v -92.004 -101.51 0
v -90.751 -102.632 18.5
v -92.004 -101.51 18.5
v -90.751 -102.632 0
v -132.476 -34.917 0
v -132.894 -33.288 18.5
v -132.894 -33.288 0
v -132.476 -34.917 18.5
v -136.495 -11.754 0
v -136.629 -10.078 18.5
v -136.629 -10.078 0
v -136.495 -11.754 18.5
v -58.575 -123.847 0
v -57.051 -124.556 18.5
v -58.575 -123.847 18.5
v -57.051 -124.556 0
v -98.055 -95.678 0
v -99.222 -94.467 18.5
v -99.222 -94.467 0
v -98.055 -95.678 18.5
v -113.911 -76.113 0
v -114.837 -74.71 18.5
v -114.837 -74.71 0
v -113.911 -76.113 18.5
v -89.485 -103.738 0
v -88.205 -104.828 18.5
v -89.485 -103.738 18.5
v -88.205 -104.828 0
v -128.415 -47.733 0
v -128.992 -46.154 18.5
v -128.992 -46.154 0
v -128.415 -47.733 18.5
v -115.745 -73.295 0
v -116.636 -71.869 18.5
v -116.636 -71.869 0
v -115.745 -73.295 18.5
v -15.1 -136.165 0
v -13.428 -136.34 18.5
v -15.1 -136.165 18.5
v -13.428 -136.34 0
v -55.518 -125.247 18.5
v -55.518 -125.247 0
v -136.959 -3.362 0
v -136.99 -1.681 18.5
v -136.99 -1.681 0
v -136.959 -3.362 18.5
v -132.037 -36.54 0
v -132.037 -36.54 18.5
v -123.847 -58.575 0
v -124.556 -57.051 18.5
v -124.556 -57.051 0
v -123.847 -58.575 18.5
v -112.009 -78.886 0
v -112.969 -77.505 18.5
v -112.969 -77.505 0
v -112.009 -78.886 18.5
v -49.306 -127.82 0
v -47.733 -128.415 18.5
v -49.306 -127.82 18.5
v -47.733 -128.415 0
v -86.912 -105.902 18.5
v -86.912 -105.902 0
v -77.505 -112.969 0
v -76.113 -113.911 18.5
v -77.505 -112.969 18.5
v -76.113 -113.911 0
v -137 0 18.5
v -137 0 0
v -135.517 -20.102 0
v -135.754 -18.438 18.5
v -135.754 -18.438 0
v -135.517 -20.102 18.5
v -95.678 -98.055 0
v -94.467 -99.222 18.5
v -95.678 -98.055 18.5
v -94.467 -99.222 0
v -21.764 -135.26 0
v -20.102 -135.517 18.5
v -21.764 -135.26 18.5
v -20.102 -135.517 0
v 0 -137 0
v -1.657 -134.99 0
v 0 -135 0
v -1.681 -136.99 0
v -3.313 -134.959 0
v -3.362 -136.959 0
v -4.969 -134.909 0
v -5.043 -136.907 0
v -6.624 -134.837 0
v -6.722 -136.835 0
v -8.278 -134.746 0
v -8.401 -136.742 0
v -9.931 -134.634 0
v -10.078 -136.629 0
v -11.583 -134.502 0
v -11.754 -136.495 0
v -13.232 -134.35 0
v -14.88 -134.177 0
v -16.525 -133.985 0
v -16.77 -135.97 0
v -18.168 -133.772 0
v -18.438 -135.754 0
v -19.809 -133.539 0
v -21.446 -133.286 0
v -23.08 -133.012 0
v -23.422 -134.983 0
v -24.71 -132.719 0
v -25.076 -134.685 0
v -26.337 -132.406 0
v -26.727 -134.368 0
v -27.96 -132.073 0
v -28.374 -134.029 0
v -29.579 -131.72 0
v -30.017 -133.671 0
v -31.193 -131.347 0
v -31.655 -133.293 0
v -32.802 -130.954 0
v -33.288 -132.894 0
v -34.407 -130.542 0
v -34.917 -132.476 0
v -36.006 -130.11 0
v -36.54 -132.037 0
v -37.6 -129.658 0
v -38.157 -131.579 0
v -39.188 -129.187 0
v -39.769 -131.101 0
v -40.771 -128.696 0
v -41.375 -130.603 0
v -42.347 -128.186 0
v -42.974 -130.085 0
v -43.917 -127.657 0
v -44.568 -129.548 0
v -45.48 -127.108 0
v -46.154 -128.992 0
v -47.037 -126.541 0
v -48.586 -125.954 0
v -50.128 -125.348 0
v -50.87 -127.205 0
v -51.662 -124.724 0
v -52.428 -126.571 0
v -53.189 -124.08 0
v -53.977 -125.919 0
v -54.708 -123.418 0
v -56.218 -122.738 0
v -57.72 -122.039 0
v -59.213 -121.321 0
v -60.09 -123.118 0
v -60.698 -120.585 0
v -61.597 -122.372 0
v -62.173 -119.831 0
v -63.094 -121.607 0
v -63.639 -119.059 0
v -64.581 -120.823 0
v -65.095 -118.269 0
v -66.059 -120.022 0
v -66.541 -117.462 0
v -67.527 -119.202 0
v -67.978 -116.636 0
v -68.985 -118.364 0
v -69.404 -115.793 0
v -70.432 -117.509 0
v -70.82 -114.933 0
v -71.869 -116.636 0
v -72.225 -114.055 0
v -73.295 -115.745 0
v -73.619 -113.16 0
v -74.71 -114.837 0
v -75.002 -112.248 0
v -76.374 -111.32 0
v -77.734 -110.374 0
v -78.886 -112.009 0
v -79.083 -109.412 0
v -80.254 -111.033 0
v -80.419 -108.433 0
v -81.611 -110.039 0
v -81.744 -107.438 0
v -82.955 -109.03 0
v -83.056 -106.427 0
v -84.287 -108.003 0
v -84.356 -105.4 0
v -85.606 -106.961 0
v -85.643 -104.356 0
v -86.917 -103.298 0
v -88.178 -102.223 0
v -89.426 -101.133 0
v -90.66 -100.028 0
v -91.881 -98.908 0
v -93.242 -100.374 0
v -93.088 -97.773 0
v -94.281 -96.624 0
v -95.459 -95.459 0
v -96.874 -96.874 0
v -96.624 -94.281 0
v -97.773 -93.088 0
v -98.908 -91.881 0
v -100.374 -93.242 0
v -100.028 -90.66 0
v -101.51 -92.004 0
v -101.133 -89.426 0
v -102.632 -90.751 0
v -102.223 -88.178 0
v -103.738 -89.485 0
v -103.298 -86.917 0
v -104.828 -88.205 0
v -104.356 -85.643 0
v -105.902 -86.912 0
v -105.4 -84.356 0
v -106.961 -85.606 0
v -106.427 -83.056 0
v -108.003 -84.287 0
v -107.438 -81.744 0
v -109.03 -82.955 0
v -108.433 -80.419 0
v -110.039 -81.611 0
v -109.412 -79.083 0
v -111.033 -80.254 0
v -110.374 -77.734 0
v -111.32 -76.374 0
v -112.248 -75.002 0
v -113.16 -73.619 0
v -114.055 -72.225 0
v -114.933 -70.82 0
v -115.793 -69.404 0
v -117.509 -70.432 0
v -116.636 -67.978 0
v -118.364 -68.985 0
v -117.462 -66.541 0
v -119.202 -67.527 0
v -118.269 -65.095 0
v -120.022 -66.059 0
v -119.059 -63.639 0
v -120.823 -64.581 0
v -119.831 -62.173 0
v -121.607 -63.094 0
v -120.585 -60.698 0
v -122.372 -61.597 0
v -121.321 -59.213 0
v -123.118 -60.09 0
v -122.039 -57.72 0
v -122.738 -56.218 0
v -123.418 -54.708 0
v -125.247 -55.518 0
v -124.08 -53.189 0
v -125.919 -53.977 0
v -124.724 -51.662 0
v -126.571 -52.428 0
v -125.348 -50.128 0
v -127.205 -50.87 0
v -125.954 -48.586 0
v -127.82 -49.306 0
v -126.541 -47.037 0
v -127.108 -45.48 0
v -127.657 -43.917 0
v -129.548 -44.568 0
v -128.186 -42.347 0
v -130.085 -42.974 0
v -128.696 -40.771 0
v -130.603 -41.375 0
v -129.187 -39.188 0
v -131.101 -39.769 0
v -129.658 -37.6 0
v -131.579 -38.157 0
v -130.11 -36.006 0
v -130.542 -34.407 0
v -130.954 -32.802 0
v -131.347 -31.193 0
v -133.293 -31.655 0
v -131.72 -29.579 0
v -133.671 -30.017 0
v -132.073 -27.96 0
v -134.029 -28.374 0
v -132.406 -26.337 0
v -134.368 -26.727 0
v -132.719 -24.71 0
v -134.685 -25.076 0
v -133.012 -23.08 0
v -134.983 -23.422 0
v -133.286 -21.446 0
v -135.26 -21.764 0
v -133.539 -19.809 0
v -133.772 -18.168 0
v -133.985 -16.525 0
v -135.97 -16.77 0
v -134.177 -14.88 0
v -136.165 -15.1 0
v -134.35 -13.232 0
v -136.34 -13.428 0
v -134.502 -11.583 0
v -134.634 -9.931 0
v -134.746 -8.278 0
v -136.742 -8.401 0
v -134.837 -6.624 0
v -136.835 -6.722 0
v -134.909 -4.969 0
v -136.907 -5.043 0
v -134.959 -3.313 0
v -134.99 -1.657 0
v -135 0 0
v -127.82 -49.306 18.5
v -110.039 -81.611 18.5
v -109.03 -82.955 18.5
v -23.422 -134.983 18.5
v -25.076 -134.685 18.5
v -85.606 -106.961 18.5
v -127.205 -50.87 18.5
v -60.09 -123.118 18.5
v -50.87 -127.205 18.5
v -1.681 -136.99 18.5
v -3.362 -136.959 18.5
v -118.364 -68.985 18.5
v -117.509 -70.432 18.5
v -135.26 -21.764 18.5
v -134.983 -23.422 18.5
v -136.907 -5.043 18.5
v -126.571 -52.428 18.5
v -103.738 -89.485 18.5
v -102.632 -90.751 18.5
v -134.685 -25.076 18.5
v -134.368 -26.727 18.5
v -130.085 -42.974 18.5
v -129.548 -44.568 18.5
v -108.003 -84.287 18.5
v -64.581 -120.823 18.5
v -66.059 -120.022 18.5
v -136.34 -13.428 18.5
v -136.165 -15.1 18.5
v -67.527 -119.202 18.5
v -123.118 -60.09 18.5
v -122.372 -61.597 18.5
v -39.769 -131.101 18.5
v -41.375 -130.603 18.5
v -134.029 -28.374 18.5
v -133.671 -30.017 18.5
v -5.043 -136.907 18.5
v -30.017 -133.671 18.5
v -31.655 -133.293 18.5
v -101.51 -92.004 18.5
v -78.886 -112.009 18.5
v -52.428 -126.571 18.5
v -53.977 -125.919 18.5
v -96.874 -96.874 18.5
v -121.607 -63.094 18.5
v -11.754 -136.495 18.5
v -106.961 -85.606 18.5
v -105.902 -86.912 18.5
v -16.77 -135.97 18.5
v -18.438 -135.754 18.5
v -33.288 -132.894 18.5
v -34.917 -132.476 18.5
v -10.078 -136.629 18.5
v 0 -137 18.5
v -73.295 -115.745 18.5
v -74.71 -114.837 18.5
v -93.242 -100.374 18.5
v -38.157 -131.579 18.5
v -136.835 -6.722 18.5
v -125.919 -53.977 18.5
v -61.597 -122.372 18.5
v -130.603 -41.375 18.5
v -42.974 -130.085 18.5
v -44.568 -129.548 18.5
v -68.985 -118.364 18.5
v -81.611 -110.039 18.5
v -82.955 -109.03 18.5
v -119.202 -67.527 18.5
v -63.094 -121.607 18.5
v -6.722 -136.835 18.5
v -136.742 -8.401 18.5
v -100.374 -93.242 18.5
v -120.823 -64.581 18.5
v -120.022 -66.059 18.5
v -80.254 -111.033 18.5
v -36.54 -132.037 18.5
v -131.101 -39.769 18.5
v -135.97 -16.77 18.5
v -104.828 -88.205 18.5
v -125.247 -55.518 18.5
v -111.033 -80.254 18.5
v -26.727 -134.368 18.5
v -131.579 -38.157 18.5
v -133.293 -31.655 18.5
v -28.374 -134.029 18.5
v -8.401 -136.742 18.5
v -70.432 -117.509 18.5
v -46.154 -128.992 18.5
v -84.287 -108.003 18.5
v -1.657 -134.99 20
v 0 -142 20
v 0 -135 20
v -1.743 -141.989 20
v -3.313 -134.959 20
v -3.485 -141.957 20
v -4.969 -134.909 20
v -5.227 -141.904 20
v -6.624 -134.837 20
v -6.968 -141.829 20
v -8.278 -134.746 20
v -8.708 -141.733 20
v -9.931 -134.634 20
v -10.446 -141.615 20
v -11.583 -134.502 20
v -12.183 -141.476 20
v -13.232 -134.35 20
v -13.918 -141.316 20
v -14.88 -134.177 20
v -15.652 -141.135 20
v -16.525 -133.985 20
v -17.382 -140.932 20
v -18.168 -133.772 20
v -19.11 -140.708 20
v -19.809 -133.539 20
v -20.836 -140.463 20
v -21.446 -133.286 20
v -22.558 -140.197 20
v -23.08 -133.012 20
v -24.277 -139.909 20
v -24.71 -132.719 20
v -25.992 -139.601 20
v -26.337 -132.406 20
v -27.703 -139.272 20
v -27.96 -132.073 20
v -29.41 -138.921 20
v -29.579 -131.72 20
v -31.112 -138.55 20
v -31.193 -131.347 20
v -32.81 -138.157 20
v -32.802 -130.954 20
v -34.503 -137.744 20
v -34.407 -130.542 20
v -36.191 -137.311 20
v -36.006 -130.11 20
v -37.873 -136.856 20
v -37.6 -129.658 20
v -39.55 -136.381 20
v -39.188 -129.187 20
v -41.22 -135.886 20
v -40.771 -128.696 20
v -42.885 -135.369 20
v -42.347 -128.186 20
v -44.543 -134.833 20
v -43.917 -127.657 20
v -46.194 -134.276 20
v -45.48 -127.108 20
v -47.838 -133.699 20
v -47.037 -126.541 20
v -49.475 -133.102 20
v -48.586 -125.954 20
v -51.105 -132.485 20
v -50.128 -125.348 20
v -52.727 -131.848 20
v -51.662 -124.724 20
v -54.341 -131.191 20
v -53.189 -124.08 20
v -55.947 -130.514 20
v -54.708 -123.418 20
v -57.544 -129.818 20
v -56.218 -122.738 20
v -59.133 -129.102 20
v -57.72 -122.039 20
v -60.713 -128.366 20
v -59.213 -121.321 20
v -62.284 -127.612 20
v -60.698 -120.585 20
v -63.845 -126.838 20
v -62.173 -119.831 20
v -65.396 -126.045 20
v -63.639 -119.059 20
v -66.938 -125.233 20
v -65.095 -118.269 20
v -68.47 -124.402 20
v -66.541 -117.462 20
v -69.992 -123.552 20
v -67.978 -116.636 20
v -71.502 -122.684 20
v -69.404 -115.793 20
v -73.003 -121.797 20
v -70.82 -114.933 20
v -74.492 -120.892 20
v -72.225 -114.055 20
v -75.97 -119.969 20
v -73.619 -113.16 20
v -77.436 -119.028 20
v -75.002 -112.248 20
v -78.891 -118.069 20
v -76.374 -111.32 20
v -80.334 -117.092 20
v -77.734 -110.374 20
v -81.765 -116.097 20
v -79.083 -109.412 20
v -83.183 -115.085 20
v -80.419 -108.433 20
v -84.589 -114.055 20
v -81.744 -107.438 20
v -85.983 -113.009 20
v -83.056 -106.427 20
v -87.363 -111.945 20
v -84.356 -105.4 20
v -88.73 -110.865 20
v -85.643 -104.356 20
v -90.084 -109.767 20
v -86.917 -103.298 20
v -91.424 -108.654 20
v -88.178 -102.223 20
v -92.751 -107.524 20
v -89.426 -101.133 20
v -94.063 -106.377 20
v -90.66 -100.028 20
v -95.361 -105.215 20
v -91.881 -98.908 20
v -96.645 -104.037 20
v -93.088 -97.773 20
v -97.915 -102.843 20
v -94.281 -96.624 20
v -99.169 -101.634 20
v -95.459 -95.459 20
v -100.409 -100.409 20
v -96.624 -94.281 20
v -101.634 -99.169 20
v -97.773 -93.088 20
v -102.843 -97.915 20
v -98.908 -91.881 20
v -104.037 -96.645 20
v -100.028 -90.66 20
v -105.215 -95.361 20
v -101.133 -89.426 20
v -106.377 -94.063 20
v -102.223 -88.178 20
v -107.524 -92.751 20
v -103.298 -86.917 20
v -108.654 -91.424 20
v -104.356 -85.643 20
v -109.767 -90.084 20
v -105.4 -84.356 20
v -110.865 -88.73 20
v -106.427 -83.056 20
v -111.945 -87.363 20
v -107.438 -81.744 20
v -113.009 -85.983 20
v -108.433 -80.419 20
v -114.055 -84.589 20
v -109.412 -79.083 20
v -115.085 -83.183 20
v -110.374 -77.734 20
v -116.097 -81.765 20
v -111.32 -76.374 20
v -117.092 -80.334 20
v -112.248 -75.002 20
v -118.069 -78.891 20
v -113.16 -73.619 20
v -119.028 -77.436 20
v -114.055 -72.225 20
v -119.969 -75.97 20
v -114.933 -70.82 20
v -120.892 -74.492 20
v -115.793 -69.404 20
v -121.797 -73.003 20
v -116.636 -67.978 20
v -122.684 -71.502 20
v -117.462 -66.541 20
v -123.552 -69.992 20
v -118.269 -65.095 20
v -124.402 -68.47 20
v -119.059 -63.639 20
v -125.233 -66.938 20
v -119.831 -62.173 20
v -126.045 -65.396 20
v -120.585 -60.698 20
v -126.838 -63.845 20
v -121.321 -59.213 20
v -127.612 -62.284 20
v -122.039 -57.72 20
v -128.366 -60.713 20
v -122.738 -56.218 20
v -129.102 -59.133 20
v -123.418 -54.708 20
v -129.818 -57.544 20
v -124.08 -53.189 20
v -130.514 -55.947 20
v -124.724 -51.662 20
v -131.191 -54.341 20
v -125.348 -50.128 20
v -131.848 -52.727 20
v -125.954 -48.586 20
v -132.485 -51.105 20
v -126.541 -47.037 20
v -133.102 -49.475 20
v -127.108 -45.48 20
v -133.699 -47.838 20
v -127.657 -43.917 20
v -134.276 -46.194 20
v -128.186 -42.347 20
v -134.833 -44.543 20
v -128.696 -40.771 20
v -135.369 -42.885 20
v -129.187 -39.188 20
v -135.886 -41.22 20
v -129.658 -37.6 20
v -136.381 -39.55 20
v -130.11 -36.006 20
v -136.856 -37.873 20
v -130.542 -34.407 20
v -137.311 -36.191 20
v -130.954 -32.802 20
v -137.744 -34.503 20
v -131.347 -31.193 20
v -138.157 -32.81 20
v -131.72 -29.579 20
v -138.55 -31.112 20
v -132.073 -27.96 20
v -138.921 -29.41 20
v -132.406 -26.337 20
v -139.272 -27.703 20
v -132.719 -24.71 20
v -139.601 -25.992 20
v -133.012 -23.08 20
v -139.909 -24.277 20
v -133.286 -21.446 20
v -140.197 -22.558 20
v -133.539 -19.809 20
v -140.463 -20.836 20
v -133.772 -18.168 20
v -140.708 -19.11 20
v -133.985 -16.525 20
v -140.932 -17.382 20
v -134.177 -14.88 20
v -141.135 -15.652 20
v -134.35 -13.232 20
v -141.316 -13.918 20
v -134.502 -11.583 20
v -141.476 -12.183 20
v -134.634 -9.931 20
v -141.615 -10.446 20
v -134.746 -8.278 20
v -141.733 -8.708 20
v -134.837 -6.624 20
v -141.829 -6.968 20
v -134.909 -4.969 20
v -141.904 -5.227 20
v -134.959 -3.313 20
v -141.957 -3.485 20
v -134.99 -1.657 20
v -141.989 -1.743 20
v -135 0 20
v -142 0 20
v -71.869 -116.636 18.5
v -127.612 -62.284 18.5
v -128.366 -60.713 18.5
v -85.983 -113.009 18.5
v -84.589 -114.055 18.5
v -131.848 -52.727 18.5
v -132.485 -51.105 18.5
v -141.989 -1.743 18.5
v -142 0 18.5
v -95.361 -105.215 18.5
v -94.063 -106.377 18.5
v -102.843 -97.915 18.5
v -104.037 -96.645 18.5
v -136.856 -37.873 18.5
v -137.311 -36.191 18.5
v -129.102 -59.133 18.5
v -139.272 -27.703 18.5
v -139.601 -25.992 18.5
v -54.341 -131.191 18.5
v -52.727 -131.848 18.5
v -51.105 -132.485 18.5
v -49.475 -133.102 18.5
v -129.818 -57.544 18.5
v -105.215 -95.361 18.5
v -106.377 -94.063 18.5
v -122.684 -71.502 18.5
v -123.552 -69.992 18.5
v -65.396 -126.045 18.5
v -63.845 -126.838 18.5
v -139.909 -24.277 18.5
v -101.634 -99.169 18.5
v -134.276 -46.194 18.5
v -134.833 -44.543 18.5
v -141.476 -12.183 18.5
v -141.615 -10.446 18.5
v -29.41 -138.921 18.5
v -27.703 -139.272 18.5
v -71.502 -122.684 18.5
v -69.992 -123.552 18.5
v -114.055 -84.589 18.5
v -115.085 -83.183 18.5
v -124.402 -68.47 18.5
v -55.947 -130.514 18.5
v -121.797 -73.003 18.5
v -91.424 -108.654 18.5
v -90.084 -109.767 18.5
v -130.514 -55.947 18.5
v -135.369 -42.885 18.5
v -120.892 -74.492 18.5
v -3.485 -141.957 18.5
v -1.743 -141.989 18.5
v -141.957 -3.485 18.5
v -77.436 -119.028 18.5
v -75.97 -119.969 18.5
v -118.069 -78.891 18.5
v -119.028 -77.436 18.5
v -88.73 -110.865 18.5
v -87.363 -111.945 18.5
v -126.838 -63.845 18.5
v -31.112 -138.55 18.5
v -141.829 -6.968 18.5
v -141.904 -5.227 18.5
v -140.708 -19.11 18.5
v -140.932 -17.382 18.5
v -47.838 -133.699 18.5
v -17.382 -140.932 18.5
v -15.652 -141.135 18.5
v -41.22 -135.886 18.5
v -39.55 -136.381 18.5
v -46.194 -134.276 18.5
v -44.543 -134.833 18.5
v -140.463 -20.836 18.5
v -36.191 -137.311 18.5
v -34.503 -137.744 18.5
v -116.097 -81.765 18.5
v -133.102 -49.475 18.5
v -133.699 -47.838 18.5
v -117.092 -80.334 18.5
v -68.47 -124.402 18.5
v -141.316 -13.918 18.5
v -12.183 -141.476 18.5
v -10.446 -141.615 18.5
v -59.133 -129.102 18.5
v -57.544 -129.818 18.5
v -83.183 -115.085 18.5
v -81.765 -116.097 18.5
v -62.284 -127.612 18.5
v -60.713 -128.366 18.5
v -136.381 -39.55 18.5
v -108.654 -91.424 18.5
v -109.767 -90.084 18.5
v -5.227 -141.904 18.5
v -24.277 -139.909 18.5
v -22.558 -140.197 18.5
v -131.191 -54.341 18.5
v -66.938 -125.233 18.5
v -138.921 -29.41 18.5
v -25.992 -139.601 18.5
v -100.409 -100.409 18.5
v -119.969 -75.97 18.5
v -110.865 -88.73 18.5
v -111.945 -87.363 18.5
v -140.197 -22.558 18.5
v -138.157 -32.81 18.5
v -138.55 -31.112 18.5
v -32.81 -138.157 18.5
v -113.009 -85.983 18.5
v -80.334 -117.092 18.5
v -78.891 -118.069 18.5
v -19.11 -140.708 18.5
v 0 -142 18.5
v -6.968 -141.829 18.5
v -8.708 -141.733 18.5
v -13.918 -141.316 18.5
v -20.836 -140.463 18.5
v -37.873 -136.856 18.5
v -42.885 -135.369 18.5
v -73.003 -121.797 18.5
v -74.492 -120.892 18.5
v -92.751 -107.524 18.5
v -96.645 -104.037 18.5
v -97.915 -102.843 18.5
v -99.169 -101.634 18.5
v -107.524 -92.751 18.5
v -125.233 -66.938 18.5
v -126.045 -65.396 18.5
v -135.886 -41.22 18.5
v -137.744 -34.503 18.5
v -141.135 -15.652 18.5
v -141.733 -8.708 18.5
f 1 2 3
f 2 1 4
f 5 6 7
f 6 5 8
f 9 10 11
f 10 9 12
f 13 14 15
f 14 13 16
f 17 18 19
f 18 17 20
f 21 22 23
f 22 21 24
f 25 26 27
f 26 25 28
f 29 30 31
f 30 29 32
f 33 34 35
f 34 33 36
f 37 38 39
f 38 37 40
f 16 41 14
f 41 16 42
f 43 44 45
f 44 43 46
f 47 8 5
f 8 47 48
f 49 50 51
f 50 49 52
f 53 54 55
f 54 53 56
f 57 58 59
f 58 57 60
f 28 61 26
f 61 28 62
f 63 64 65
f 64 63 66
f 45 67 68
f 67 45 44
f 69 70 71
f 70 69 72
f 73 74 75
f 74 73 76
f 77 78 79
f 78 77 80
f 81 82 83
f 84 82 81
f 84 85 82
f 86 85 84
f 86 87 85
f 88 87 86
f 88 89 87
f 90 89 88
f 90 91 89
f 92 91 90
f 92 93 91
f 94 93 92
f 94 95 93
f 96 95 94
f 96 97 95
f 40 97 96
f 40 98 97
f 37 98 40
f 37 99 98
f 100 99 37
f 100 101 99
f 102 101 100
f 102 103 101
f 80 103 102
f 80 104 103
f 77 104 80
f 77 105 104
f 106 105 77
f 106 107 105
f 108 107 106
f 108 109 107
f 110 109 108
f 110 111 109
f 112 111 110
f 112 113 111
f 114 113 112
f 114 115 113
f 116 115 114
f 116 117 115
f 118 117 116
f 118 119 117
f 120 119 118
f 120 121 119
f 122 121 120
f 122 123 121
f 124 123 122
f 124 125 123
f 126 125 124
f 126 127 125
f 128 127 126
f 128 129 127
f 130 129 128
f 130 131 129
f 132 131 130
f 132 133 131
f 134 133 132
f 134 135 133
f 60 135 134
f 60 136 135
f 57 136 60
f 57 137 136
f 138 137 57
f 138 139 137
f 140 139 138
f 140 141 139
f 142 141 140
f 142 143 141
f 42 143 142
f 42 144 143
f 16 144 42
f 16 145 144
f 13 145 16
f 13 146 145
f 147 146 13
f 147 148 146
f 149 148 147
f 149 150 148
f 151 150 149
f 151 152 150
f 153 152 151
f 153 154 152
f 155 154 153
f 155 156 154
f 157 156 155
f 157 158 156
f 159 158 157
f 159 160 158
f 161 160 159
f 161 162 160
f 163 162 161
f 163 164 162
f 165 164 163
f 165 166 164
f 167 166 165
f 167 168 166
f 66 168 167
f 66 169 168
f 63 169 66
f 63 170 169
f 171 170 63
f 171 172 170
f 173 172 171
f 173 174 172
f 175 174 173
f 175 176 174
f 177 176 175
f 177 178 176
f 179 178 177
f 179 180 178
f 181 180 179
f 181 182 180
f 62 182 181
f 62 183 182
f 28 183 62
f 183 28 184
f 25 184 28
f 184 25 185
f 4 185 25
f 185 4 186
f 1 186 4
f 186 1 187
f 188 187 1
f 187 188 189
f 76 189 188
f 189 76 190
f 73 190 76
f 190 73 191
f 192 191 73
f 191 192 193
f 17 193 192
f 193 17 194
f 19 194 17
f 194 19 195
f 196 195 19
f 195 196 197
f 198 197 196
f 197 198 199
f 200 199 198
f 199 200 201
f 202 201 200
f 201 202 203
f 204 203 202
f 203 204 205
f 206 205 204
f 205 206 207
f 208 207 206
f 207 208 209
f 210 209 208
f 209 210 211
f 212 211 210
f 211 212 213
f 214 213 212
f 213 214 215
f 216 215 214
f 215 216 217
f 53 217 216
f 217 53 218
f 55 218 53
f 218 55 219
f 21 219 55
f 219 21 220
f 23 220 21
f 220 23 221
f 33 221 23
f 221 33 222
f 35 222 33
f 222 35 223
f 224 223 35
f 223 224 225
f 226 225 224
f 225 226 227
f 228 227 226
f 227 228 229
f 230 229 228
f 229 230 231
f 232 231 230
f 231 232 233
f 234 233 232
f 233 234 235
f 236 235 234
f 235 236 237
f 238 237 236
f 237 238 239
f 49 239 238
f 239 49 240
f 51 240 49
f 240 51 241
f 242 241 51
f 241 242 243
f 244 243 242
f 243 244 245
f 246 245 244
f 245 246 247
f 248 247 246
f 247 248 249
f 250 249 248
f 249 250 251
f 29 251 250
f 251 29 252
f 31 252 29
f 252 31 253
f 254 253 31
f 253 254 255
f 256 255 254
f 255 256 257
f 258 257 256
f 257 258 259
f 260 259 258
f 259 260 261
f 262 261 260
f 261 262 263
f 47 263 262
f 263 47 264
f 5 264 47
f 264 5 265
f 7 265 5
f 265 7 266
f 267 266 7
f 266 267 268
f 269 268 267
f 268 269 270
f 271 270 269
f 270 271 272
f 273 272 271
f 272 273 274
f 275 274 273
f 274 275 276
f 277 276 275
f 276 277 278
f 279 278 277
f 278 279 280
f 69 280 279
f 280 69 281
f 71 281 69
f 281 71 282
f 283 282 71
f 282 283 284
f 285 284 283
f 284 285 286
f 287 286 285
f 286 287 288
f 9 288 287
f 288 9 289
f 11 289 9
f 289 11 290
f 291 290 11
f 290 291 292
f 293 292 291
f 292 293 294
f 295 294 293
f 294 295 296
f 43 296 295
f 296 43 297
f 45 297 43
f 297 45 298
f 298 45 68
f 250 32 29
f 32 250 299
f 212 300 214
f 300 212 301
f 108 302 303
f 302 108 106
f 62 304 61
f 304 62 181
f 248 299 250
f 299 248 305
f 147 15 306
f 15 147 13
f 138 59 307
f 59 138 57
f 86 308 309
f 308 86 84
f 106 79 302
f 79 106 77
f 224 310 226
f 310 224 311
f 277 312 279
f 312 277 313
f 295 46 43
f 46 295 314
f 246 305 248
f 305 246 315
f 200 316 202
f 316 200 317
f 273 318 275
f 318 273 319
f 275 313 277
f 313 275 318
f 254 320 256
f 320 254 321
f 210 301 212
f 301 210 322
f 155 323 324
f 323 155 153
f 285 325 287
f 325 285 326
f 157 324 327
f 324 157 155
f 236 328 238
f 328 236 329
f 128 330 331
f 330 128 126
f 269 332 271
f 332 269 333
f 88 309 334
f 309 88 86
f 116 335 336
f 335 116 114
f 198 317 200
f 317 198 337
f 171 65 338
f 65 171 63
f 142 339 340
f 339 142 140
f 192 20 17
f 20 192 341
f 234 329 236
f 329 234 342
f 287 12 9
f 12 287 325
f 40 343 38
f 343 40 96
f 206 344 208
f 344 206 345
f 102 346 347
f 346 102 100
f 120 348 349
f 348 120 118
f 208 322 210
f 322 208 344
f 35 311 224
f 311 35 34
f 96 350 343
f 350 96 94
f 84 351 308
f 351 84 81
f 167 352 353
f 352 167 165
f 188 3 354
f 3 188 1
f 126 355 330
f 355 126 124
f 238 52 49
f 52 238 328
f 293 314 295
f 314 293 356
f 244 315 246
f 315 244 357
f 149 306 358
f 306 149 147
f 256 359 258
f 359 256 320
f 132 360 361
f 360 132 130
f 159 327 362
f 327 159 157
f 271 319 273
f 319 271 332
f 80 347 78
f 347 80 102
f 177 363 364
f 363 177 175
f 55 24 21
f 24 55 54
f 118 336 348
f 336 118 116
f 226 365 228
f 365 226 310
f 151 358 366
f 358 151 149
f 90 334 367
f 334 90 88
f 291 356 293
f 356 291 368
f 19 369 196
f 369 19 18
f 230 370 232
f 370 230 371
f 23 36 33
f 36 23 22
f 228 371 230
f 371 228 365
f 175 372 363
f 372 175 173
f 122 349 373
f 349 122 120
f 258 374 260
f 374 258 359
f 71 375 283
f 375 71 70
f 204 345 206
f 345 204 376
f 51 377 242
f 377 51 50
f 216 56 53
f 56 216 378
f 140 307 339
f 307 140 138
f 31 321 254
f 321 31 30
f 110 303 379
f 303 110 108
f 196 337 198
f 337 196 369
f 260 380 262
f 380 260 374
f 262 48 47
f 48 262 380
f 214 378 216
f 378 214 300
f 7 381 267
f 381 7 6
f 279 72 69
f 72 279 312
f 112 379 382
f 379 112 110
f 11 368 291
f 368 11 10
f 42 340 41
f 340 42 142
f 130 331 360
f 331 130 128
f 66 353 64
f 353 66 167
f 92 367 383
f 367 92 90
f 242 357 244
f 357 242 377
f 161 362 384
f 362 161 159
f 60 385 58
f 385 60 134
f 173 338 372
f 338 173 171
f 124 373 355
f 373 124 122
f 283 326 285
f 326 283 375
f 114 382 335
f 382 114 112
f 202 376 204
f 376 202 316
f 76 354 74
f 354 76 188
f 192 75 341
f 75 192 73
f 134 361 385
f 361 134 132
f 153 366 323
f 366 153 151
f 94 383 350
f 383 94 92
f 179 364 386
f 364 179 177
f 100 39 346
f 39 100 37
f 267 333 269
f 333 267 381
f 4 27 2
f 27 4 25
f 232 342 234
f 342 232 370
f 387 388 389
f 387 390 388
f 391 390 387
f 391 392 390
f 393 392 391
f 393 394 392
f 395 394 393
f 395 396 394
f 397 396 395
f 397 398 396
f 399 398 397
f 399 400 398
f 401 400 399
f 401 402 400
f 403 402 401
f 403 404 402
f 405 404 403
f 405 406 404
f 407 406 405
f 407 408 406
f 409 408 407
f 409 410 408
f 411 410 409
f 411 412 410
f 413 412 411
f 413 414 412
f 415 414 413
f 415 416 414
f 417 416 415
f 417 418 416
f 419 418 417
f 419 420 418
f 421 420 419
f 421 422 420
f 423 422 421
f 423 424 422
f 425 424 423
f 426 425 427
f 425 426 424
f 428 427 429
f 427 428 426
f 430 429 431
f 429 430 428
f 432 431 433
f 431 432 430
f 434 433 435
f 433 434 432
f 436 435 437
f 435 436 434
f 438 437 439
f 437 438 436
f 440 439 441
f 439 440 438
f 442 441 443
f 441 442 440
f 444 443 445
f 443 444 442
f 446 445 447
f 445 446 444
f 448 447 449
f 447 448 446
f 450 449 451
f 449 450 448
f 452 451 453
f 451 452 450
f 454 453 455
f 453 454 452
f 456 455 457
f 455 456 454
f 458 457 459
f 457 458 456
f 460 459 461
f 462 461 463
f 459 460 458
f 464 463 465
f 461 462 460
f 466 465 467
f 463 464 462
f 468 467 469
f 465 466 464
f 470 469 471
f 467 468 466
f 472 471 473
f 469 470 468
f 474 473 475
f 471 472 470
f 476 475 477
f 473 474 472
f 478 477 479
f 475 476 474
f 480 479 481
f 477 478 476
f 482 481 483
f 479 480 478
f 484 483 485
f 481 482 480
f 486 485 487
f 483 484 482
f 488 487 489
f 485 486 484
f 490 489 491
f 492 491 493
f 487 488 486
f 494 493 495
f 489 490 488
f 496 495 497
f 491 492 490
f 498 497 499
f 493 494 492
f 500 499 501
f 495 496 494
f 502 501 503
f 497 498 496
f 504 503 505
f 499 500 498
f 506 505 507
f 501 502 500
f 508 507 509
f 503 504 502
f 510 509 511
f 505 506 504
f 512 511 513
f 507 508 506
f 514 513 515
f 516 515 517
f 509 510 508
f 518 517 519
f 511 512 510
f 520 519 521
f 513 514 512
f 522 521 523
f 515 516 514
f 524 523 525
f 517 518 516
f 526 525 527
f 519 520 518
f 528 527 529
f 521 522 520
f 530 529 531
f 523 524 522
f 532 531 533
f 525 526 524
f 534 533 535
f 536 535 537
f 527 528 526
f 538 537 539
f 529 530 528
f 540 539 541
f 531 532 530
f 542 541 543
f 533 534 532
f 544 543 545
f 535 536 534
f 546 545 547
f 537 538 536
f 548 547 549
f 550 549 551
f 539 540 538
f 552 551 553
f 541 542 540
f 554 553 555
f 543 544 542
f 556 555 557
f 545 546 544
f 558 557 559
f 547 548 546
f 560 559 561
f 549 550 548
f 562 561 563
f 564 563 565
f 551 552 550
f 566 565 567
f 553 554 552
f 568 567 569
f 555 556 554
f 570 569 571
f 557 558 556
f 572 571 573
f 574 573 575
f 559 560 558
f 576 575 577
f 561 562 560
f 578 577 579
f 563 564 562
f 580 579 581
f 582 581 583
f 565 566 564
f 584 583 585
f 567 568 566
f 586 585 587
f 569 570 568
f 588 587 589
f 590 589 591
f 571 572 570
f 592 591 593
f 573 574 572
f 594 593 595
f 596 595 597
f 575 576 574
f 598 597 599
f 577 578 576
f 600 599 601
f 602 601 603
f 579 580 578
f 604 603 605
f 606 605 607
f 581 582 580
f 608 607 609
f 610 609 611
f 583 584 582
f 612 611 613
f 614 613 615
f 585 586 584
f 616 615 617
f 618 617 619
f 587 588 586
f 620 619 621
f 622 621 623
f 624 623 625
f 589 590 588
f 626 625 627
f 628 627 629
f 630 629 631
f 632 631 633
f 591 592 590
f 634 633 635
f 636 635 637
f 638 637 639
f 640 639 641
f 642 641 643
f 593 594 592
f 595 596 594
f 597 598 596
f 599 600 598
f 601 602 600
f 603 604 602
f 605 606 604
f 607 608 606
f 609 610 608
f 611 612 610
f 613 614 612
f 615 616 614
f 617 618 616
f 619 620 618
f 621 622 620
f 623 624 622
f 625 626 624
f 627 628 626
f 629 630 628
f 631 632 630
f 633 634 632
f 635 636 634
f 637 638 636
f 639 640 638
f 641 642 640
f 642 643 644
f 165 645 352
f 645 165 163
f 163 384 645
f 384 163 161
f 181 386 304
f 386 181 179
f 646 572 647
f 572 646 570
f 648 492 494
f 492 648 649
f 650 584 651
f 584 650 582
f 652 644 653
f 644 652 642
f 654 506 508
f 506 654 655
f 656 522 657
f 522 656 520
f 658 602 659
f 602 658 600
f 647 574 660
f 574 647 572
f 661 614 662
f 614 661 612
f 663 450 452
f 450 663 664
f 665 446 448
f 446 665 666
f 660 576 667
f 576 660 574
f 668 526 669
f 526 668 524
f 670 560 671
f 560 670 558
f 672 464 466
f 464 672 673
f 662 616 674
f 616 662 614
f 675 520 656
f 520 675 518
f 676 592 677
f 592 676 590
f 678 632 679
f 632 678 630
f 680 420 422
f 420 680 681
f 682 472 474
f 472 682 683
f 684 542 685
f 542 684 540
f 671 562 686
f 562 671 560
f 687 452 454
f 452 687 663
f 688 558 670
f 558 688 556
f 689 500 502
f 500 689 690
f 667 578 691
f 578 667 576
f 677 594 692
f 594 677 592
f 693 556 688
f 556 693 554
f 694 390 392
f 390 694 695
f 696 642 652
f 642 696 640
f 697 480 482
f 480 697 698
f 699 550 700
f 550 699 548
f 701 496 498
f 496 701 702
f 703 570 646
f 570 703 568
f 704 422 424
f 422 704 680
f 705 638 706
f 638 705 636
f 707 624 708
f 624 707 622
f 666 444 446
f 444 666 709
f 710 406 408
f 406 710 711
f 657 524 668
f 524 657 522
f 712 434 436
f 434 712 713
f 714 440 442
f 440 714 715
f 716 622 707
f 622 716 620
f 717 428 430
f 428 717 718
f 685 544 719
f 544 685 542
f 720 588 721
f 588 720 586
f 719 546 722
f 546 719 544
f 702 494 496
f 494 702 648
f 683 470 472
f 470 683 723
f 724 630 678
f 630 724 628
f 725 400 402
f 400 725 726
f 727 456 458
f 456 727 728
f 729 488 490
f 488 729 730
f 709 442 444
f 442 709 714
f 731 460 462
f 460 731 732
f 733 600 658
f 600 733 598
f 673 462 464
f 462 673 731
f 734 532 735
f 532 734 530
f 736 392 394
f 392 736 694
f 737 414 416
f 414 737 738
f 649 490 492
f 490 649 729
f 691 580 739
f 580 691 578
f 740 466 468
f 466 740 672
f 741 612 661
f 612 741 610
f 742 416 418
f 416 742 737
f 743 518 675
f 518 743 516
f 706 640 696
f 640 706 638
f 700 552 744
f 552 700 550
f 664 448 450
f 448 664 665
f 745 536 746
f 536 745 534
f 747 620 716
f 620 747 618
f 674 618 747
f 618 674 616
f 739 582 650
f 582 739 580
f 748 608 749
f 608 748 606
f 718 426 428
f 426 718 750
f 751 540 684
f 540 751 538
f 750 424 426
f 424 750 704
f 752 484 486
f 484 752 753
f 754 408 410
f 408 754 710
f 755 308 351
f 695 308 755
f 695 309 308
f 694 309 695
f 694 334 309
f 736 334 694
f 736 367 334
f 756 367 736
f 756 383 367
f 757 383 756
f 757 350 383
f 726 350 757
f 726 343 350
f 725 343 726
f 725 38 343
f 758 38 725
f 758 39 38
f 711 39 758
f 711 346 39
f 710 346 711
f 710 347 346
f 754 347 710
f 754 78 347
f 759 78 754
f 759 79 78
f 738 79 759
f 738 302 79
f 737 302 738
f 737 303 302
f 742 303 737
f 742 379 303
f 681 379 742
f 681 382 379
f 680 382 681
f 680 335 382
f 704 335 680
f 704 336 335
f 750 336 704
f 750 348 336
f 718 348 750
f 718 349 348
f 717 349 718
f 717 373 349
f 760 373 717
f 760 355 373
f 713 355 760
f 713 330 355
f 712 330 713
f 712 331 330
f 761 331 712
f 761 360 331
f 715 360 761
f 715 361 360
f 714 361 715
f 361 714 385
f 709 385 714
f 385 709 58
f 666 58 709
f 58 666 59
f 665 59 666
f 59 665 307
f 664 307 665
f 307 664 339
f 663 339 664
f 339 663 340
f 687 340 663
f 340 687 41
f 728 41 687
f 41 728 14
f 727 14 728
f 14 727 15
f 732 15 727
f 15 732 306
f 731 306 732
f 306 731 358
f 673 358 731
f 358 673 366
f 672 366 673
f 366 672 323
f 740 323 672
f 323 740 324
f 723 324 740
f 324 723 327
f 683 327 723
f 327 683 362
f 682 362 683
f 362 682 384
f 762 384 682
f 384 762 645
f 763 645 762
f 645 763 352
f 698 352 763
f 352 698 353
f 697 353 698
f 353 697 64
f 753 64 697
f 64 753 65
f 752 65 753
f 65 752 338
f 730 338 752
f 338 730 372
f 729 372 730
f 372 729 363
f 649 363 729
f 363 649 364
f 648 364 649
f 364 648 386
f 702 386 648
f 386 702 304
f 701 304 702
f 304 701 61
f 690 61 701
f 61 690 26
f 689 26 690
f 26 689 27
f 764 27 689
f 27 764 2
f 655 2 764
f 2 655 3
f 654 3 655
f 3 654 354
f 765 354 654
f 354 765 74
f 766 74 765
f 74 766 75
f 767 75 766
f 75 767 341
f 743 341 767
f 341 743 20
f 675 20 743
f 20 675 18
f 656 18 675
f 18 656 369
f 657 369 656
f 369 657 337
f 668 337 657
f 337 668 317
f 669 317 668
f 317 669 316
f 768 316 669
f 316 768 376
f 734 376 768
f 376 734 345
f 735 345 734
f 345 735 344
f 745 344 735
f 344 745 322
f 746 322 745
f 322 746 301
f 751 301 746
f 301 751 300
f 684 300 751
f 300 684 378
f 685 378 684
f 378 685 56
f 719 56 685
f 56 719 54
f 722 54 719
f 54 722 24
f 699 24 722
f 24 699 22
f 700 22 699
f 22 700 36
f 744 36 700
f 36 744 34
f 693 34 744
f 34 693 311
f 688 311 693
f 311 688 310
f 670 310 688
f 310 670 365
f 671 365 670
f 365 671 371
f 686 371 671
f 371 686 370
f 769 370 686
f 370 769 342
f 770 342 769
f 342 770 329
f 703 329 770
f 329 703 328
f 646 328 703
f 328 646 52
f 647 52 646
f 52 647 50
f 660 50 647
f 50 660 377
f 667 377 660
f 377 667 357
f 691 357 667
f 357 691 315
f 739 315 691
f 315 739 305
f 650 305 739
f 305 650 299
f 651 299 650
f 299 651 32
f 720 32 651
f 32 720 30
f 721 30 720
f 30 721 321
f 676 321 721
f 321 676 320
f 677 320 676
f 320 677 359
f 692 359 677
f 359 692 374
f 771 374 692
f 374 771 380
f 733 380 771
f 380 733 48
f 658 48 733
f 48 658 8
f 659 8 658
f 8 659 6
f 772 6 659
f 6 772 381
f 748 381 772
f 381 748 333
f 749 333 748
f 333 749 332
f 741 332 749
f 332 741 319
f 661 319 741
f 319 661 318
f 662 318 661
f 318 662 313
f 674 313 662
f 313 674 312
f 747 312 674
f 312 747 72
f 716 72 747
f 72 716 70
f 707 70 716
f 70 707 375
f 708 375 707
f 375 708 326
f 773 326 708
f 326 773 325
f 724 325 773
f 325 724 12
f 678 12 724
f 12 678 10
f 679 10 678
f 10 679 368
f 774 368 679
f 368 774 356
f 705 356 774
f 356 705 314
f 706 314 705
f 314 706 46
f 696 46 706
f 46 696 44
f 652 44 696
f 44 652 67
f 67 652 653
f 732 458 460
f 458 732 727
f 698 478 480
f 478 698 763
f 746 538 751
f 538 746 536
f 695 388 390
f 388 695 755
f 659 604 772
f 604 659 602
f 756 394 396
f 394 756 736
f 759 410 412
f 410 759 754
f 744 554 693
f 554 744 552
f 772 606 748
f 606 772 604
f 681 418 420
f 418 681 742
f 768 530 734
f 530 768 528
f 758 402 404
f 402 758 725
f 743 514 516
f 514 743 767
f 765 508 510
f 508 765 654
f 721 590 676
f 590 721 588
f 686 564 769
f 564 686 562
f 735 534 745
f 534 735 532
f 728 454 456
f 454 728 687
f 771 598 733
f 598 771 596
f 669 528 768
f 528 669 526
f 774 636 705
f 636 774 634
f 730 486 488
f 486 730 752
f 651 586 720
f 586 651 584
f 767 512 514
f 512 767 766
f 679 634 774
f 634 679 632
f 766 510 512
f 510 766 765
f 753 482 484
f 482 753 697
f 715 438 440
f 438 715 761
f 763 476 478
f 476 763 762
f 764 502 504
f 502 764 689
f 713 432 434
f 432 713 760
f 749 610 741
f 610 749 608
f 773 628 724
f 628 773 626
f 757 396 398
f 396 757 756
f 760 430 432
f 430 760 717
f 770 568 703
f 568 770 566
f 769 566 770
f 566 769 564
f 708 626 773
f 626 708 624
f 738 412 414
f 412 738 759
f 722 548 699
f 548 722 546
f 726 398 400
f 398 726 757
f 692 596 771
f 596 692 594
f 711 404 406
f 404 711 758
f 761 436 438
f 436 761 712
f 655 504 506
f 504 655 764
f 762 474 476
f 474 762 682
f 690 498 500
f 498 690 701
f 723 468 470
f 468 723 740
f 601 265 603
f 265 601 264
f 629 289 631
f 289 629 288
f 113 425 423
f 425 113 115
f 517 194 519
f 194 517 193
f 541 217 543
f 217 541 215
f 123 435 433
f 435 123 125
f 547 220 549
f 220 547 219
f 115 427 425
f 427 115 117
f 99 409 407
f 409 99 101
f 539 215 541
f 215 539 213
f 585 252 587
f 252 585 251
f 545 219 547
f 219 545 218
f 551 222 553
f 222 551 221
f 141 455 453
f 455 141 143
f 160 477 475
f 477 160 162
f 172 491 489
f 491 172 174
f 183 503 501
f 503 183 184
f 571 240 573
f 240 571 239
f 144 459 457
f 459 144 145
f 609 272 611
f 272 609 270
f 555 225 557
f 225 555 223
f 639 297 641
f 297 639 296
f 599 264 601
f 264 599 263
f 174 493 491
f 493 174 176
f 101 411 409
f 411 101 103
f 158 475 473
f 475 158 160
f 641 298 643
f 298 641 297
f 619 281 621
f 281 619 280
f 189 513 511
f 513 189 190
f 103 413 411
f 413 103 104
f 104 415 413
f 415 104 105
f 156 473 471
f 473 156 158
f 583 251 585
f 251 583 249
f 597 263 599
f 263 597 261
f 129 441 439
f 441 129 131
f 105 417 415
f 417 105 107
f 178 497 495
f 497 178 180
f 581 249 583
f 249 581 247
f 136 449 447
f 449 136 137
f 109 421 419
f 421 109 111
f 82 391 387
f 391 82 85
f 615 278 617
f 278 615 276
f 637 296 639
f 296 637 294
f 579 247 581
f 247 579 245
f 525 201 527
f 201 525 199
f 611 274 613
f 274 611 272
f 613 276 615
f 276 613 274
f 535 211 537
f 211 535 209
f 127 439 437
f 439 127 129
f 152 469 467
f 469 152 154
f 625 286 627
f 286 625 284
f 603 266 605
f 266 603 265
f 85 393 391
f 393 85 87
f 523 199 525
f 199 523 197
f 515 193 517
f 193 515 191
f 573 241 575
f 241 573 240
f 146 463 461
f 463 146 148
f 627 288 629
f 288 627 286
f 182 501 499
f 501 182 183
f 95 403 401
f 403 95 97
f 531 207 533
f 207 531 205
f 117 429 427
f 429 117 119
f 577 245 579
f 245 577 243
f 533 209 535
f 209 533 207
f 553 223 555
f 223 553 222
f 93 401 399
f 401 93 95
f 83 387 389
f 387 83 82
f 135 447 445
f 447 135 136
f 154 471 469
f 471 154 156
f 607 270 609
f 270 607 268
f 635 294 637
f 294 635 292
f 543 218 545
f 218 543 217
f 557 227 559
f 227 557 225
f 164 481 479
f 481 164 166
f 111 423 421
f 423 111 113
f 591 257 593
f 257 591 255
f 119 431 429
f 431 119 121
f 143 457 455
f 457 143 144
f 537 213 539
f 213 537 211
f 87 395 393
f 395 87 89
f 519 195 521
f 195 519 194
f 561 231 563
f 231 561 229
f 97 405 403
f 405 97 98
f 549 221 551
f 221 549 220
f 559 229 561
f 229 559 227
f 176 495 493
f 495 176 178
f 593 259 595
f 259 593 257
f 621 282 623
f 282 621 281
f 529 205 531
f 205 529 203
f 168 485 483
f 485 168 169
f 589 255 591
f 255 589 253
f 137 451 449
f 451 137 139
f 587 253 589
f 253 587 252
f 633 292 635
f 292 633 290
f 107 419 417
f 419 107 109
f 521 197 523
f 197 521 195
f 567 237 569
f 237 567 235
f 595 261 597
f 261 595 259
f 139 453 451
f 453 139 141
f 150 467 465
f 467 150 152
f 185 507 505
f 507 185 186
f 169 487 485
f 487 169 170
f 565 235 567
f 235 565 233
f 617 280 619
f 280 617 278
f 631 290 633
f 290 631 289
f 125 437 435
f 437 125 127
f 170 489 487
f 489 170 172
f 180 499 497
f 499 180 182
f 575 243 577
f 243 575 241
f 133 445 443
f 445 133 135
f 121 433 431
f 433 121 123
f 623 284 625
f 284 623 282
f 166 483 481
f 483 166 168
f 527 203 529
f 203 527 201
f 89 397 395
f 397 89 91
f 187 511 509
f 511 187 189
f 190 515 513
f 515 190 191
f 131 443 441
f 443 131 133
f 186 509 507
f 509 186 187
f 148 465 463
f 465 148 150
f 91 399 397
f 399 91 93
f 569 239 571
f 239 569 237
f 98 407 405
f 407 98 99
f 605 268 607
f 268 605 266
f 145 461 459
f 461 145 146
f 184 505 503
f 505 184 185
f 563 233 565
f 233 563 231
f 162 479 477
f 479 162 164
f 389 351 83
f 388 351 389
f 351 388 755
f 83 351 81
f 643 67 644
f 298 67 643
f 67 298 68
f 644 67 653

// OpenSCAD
$fn=512;
difference(){
union(){
cylinder(r=135+2,h=20);
translate([0,0,18.5])
cylinder(r=135+2+5,h=1.5);
}
translate([0,0,-5])
cylinder(r=135,h=30);
translate([0,-190,-1])
cube([200,200*2,50]);
translate([-190,0,-1])
cube([200*2,200,50]);
}
